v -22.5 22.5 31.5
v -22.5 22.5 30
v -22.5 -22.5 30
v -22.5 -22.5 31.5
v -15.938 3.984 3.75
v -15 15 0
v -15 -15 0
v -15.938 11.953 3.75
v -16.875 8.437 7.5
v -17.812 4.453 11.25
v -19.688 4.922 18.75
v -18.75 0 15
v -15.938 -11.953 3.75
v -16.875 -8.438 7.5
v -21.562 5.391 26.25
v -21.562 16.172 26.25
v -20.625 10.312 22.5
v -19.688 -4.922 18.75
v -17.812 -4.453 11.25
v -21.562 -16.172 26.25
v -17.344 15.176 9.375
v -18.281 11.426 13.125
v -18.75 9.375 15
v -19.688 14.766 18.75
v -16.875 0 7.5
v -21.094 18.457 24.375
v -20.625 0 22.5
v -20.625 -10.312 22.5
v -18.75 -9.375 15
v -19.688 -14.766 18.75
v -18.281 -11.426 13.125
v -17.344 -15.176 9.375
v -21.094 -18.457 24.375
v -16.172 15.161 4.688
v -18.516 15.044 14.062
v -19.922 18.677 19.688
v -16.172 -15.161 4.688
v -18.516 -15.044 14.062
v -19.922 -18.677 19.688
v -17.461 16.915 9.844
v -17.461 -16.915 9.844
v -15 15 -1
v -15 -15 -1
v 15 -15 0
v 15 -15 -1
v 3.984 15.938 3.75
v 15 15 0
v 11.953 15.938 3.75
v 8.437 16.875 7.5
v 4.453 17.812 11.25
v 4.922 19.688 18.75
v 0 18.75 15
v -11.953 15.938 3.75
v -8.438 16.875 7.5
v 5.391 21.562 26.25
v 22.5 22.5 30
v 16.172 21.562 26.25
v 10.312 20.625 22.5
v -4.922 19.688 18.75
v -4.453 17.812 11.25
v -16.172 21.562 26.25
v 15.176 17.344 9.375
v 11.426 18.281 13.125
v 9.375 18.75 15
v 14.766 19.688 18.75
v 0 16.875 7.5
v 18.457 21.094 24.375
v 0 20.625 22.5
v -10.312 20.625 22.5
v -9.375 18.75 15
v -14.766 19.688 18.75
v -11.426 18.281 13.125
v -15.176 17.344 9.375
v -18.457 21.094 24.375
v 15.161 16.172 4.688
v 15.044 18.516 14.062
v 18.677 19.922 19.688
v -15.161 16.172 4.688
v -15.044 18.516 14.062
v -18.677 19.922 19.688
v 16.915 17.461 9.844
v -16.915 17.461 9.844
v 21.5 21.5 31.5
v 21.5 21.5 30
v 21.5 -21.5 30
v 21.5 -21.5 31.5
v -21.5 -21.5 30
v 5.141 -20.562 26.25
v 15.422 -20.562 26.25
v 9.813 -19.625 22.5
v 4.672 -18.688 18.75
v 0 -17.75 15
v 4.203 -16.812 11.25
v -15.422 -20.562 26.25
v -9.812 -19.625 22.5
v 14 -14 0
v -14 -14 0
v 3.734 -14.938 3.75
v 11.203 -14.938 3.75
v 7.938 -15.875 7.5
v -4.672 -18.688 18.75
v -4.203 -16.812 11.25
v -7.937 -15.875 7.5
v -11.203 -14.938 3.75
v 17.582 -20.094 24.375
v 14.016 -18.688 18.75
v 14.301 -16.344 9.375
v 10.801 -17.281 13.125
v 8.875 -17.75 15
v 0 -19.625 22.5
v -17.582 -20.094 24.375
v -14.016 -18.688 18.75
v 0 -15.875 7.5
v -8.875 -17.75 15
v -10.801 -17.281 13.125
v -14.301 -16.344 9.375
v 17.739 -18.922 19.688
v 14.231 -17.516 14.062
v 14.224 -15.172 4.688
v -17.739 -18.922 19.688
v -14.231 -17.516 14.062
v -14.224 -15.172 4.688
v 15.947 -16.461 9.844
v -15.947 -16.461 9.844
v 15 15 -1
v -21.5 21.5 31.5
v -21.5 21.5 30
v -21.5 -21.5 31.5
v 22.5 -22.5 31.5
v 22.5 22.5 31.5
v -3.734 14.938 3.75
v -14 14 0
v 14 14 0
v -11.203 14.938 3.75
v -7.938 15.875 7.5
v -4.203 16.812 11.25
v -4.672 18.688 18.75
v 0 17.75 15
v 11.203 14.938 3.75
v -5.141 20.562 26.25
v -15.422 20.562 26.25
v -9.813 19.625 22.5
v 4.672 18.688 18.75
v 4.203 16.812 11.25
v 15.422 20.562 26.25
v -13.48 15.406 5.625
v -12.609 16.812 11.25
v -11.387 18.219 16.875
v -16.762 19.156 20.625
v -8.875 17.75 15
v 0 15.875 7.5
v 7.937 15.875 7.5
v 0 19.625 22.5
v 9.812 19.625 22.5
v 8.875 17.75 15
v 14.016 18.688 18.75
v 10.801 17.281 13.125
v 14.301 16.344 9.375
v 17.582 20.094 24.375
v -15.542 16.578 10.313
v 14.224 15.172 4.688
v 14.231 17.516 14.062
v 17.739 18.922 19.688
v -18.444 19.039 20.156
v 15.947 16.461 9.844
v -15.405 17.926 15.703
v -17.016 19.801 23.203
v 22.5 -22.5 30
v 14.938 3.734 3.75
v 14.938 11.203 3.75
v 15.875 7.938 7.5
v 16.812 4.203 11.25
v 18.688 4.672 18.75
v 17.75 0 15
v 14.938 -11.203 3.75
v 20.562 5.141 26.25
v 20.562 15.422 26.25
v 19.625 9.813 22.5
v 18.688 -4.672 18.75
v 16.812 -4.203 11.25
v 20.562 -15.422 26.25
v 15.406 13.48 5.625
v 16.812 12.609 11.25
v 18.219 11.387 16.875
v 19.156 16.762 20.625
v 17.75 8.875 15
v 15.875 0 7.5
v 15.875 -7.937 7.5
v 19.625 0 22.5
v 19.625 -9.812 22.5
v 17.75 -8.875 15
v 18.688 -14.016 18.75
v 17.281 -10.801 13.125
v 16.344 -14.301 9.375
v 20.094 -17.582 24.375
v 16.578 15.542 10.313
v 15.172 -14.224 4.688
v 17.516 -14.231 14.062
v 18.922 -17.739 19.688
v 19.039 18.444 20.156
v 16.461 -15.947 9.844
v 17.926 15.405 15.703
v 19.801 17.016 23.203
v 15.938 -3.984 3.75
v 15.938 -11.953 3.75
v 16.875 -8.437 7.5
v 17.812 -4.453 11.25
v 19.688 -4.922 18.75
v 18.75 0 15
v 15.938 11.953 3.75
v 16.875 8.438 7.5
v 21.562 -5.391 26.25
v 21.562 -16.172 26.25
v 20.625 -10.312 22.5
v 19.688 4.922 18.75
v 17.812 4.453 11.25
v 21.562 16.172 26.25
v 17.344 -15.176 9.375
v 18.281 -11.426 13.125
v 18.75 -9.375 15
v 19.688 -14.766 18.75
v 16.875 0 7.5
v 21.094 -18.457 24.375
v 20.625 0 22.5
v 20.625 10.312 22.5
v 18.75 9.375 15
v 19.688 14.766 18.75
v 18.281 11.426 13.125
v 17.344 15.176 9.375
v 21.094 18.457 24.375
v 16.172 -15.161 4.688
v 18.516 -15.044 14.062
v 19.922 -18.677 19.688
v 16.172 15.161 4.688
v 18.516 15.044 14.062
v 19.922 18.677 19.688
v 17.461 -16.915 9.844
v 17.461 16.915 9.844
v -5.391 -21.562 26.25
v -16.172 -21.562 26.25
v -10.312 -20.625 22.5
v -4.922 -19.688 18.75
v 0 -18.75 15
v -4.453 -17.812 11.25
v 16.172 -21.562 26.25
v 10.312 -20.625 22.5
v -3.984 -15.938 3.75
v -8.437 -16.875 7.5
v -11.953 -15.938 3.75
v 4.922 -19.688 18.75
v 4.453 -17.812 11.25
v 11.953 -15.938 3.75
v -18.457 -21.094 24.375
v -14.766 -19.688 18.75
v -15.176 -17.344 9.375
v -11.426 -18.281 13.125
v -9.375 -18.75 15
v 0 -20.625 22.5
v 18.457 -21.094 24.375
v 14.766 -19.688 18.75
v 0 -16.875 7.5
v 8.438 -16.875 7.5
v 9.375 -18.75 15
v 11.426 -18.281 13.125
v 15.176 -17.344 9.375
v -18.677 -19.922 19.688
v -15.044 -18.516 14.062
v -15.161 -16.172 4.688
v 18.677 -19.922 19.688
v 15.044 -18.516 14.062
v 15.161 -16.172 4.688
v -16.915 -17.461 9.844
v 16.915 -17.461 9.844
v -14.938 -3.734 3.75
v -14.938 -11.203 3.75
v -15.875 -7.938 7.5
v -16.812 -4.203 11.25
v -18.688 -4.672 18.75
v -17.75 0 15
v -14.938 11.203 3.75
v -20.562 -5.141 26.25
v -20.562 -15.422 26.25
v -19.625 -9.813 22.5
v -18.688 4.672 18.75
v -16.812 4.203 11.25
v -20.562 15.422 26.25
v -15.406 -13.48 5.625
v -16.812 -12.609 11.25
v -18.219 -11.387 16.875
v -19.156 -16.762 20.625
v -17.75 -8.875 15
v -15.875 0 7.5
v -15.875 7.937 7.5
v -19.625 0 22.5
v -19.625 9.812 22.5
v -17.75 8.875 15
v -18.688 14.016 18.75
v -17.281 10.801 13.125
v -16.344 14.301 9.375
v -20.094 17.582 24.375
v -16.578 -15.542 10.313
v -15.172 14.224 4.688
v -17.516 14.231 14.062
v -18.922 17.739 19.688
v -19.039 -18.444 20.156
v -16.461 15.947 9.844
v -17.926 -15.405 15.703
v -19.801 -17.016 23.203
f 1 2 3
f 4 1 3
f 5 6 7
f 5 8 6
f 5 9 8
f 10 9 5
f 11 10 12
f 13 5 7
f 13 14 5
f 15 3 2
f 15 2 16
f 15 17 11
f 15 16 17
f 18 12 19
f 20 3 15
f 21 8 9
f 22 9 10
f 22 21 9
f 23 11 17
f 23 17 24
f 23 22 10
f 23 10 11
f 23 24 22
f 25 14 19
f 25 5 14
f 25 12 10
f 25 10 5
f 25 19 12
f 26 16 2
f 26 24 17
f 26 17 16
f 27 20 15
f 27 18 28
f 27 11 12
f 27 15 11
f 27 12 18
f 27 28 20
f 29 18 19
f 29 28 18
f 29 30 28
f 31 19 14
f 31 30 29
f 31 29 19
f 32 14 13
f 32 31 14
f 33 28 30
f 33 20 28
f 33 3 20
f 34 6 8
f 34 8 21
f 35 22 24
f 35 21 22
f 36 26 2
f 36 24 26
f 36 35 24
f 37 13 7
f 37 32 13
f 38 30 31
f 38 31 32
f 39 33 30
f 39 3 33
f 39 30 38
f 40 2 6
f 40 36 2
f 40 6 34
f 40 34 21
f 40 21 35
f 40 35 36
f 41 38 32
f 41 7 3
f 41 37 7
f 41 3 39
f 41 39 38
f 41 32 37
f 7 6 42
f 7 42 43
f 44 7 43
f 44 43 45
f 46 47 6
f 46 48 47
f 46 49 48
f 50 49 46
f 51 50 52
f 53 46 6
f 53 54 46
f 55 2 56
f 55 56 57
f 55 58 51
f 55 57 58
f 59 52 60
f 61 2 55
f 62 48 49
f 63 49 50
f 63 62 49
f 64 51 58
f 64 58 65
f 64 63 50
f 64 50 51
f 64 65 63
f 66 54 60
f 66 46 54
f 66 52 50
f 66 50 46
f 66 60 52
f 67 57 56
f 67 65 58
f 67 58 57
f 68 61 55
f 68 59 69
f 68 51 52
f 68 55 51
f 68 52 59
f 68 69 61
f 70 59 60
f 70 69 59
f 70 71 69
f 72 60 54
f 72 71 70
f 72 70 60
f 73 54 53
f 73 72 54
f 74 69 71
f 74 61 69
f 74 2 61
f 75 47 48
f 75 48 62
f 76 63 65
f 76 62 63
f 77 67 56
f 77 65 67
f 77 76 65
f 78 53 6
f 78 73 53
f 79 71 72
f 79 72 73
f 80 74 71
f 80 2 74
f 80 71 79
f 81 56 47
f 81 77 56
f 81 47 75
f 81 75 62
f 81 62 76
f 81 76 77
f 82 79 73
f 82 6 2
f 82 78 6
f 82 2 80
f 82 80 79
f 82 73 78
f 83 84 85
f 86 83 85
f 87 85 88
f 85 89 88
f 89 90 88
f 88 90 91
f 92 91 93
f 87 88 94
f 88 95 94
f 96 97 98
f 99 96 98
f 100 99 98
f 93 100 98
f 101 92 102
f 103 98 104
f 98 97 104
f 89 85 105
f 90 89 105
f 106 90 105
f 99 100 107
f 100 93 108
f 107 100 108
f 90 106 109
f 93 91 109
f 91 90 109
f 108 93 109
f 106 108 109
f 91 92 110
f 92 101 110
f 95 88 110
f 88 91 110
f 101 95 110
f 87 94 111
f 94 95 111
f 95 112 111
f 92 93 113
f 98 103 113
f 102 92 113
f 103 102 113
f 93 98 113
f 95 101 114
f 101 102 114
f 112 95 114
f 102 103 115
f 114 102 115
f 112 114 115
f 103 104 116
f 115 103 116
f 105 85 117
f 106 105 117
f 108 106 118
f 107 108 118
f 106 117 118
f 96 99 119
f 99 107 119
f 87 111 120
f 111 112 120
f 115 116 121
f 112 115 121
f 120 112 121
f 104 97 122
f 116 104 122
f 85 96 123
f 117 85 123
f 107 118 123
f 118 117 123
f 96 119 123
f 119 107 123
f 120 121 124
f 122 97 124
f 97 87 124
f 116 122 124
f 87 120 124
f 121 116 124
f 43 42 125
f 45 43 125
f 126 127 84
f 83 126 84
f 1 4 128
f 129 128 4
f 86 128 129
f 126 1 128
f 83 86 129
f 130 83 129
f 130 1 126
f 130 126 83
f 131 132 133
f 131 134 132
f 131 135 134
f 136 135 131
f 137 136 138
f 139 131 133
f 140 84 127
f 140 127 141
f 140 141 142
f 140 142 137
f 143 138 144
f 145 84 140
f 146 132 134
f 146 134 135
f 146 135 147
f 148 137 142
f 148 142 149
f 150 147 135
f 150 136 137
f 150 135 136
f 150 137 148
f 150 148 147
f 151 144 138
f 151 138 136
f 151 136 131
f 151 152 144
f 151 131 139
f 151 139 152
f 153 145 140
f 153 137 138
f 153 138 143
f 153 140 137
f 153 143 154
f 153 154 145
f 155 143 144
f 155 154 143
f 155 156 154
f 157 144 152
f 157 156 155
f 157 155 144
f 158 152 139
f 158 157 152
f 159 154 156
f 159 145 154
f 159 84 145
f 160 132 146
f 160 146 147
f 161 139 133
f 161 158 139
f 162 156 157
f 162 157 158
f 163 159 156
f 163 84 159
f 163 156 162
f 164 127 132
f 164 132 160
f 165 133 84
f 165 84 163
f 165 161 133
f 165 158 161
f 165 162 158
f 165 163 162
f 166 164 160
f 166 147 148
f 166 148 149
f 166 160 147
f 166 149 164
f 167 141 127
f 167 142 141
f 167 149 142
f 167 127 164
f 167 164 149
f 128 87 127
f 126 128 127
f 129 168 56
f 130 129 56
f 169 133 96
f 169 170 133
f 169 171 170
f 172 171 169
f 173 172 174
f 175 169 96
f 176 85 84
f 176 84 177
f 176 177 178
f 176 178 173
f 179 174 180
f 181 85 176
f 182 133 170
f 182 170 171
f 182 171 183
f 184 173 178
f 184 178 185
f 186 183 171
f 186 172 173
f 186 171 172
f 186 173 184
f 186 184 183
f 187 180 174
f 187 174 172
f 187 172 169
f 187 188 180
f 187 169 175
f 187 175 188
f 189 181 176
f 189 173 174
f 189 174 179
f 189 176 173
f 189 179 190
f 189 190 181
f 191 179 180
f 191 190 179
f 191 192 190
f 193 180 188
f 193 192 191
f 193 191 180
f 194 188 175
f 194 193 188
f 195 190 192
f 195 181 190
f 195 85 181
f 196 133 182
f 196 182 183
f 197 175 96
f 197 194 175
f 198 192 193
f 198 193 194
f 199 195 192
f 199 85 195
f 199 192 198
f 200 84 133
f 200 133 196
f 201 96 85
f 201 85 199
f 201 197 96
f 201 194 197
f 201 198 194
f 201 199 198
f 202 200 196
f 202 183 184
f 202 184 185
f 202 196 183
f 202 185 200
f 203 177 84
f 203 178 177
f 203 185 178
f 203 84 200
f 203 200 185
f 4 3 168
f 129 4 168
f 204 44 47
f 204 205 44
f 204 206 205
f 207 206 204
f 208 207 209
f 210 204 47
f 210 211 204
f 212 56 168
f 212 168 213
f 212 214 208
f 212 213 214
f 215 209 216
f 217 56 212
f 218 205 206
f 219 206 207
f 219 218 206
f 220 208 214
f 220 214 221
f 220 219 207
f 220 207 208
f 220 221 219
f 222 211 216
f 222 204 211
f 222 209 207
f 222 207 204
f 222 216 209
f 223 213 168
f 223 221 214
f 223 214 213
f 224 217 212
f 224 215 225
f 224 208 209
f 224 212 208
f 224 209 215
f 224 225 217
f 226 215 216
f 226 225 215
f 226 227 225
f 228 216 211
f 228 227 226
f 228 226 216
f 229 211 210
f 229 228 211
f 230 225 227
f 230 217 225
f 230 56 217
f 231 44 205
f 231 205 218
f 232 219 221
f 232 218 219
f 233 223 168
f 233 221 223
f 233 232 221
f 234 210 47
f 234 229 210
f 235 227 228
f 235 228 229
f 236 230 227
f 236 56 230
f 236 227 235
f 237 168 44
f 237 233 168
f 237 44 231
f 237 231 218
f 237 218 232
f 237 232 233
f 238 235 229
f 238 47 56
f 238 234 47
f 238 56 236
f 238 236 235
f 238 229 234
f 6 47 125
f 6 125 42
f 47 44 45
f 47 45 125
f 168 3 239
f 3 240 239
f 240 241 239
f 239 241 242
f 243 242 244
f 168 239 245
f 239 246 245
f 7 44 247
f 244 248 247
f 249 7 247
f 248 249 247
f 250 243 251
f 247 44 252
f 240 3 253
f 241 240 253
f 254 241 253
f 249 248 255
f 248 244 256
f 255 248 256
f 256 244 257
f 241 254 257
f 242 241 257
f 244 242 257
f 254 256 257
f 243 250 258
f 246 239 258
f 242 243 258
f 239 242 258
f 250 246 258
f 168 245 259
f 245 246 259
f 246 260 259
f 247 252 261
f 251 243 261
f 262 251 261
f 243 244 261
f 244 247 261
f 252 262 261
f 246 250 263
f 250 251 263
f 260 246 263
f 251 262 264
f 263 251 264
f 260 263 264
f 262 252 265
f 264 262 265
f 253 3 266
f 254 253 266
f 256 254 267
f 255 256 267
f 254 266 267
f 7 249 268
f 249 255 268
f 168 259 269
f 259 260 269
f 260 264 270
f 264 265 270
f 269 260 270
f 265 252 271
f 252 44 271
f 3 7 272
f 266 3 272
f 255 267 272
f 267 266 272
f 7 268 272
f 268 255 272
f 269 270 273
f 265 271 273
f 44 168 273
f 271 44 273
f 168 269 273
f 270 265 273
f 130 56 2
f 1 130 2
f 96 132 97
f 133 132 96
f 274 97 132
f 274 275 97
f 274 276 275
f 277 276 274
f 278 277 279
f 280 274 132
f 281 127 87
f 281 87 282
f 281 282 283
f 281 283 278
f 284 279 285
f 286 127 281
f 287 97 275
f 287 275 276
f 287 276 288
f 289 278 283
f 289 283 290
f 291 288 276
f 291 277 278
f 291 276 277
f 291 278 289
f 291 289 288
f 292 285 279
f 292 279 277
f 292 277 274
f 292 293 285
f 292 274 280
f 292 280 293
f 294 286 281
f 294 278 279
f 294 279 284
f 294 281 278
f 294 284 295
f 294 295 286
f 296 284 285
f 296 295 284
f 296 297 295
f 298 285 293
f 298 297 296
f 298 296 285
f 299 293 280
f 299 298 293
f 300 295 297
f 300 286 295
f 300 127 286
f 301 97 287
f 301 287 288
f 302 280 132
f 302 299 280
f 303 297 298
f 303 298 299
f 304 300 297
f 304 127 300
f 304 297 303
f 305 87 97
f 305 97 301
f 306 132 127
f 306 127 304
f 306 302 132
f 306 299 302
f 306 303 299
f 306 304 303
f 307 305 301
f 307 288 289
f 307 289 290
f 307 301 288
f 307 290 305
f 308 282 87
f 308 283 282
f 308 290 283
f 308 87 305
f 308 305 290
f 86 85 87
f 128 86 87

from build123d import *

# Parameters (mm, degrees)
F0_W     = 28
F0_H     = 28
F7_DEPTH = 1
F8_DEPTH = 1.5


with BuildPart() as f3:
    # F2 (on offset) → F3 section 0
    with BuildSketch(Plane.XY.offset(30)):
        Polygon((22.5, -22.5), (21.5, -21.5), (-21.5, -21.5), (-22.5, -22.5), align=None)
    # F0 (on Top) → F3 section 1
    with BuildSketch(Plane.XY):
        Polygon((15, -15), (14, -14), (-14, -14), (-15, -15), align=None)
    loft()

    # F0 (on Top) → F4 section 0
    with BuildSketch(Plane.XY):
        Polygon((14, 14), (14, -14), (15, -15), (15, 15), align=None)
    # F2 (on offset) → F4 section 1
    with BuildSketch(Plane.XY.offset(30)):
        Polygon((21.5, 21.5), (21.5, -21.5), (22.5, -22.5), (22.5, 22.5), align=None)
    loft()

    # F0 (on Top) → F5 section 0
    with BuildSketch(Plane.XY):
        Polygon((-14, 14), (14, 14), (15, 15), (-15, 15), align=None)
    # F2 (on offset) → F5 section 1
    with BuildSketch(Plane.XY.offset(30)):
        Polygon((-21.5, 21.5), (21.5, 21.5), (22.5, 22.5), (-22.5, 22.5), align=None)
    loft()

    # F0 (on Top) → F6 section 0
    with BuildSketch(Plane.XY):
        Polygon((-15, -15), (-14, -14), (-14, 14), (-15, 15), align=None)
    # F2 (on offset) → F6 section 1
    with BuildSketch(Plane.XY.offset(30)):
        Polygon((-22.5, -22.5), (-21.5, -21.5), (-21.5, 21.5), (-22.5, 22.5), align=None)
    loft()

    # F0 (on Top) → F7 (join)
    with BuildSketch(Plane.XY):
        Polygon((-14, 14), (14, 14), (15, 15), (-15, 15), align=None)
        Polygon((-15, -15), (-14, -14), (-14, 14), (-15, 15), align=None)
        Polygon((15, -15), (14, -14), (-14, -14), (-15, -15), align=None)
        Polygon((14, 14), (14, -14), (15, -15), (15, 15), align=None)
        Rectangle(F0_W, F0_H)
    extrude(amount=-F7_DEPTH)

    # F2 (on offset) → F8 (join)
    with BuildSketch(Plane.XY.offset(30)):
        Polygon((22.5, -22.5), (21.5, -21.5), (-21.5, -21.5), (-22.5, -22.5), align=None)
        Polygon((21.5, 21.5), (21.5, -21.5), (22.5, -22.5), (22.5, 22.5), align=None)
        Polygon((-21.5, 21.5), (21.5, 21.5), (22.5, 22.5), (-22.5, 22.5), align=None)
        Polygon((-22.5, -22.5), (-21.5, -21.5), (-21.5, 21.5), (-22.5, 22.5), align=None)
    extrude(amount=F8_DEPTH)


solid = f3.part
